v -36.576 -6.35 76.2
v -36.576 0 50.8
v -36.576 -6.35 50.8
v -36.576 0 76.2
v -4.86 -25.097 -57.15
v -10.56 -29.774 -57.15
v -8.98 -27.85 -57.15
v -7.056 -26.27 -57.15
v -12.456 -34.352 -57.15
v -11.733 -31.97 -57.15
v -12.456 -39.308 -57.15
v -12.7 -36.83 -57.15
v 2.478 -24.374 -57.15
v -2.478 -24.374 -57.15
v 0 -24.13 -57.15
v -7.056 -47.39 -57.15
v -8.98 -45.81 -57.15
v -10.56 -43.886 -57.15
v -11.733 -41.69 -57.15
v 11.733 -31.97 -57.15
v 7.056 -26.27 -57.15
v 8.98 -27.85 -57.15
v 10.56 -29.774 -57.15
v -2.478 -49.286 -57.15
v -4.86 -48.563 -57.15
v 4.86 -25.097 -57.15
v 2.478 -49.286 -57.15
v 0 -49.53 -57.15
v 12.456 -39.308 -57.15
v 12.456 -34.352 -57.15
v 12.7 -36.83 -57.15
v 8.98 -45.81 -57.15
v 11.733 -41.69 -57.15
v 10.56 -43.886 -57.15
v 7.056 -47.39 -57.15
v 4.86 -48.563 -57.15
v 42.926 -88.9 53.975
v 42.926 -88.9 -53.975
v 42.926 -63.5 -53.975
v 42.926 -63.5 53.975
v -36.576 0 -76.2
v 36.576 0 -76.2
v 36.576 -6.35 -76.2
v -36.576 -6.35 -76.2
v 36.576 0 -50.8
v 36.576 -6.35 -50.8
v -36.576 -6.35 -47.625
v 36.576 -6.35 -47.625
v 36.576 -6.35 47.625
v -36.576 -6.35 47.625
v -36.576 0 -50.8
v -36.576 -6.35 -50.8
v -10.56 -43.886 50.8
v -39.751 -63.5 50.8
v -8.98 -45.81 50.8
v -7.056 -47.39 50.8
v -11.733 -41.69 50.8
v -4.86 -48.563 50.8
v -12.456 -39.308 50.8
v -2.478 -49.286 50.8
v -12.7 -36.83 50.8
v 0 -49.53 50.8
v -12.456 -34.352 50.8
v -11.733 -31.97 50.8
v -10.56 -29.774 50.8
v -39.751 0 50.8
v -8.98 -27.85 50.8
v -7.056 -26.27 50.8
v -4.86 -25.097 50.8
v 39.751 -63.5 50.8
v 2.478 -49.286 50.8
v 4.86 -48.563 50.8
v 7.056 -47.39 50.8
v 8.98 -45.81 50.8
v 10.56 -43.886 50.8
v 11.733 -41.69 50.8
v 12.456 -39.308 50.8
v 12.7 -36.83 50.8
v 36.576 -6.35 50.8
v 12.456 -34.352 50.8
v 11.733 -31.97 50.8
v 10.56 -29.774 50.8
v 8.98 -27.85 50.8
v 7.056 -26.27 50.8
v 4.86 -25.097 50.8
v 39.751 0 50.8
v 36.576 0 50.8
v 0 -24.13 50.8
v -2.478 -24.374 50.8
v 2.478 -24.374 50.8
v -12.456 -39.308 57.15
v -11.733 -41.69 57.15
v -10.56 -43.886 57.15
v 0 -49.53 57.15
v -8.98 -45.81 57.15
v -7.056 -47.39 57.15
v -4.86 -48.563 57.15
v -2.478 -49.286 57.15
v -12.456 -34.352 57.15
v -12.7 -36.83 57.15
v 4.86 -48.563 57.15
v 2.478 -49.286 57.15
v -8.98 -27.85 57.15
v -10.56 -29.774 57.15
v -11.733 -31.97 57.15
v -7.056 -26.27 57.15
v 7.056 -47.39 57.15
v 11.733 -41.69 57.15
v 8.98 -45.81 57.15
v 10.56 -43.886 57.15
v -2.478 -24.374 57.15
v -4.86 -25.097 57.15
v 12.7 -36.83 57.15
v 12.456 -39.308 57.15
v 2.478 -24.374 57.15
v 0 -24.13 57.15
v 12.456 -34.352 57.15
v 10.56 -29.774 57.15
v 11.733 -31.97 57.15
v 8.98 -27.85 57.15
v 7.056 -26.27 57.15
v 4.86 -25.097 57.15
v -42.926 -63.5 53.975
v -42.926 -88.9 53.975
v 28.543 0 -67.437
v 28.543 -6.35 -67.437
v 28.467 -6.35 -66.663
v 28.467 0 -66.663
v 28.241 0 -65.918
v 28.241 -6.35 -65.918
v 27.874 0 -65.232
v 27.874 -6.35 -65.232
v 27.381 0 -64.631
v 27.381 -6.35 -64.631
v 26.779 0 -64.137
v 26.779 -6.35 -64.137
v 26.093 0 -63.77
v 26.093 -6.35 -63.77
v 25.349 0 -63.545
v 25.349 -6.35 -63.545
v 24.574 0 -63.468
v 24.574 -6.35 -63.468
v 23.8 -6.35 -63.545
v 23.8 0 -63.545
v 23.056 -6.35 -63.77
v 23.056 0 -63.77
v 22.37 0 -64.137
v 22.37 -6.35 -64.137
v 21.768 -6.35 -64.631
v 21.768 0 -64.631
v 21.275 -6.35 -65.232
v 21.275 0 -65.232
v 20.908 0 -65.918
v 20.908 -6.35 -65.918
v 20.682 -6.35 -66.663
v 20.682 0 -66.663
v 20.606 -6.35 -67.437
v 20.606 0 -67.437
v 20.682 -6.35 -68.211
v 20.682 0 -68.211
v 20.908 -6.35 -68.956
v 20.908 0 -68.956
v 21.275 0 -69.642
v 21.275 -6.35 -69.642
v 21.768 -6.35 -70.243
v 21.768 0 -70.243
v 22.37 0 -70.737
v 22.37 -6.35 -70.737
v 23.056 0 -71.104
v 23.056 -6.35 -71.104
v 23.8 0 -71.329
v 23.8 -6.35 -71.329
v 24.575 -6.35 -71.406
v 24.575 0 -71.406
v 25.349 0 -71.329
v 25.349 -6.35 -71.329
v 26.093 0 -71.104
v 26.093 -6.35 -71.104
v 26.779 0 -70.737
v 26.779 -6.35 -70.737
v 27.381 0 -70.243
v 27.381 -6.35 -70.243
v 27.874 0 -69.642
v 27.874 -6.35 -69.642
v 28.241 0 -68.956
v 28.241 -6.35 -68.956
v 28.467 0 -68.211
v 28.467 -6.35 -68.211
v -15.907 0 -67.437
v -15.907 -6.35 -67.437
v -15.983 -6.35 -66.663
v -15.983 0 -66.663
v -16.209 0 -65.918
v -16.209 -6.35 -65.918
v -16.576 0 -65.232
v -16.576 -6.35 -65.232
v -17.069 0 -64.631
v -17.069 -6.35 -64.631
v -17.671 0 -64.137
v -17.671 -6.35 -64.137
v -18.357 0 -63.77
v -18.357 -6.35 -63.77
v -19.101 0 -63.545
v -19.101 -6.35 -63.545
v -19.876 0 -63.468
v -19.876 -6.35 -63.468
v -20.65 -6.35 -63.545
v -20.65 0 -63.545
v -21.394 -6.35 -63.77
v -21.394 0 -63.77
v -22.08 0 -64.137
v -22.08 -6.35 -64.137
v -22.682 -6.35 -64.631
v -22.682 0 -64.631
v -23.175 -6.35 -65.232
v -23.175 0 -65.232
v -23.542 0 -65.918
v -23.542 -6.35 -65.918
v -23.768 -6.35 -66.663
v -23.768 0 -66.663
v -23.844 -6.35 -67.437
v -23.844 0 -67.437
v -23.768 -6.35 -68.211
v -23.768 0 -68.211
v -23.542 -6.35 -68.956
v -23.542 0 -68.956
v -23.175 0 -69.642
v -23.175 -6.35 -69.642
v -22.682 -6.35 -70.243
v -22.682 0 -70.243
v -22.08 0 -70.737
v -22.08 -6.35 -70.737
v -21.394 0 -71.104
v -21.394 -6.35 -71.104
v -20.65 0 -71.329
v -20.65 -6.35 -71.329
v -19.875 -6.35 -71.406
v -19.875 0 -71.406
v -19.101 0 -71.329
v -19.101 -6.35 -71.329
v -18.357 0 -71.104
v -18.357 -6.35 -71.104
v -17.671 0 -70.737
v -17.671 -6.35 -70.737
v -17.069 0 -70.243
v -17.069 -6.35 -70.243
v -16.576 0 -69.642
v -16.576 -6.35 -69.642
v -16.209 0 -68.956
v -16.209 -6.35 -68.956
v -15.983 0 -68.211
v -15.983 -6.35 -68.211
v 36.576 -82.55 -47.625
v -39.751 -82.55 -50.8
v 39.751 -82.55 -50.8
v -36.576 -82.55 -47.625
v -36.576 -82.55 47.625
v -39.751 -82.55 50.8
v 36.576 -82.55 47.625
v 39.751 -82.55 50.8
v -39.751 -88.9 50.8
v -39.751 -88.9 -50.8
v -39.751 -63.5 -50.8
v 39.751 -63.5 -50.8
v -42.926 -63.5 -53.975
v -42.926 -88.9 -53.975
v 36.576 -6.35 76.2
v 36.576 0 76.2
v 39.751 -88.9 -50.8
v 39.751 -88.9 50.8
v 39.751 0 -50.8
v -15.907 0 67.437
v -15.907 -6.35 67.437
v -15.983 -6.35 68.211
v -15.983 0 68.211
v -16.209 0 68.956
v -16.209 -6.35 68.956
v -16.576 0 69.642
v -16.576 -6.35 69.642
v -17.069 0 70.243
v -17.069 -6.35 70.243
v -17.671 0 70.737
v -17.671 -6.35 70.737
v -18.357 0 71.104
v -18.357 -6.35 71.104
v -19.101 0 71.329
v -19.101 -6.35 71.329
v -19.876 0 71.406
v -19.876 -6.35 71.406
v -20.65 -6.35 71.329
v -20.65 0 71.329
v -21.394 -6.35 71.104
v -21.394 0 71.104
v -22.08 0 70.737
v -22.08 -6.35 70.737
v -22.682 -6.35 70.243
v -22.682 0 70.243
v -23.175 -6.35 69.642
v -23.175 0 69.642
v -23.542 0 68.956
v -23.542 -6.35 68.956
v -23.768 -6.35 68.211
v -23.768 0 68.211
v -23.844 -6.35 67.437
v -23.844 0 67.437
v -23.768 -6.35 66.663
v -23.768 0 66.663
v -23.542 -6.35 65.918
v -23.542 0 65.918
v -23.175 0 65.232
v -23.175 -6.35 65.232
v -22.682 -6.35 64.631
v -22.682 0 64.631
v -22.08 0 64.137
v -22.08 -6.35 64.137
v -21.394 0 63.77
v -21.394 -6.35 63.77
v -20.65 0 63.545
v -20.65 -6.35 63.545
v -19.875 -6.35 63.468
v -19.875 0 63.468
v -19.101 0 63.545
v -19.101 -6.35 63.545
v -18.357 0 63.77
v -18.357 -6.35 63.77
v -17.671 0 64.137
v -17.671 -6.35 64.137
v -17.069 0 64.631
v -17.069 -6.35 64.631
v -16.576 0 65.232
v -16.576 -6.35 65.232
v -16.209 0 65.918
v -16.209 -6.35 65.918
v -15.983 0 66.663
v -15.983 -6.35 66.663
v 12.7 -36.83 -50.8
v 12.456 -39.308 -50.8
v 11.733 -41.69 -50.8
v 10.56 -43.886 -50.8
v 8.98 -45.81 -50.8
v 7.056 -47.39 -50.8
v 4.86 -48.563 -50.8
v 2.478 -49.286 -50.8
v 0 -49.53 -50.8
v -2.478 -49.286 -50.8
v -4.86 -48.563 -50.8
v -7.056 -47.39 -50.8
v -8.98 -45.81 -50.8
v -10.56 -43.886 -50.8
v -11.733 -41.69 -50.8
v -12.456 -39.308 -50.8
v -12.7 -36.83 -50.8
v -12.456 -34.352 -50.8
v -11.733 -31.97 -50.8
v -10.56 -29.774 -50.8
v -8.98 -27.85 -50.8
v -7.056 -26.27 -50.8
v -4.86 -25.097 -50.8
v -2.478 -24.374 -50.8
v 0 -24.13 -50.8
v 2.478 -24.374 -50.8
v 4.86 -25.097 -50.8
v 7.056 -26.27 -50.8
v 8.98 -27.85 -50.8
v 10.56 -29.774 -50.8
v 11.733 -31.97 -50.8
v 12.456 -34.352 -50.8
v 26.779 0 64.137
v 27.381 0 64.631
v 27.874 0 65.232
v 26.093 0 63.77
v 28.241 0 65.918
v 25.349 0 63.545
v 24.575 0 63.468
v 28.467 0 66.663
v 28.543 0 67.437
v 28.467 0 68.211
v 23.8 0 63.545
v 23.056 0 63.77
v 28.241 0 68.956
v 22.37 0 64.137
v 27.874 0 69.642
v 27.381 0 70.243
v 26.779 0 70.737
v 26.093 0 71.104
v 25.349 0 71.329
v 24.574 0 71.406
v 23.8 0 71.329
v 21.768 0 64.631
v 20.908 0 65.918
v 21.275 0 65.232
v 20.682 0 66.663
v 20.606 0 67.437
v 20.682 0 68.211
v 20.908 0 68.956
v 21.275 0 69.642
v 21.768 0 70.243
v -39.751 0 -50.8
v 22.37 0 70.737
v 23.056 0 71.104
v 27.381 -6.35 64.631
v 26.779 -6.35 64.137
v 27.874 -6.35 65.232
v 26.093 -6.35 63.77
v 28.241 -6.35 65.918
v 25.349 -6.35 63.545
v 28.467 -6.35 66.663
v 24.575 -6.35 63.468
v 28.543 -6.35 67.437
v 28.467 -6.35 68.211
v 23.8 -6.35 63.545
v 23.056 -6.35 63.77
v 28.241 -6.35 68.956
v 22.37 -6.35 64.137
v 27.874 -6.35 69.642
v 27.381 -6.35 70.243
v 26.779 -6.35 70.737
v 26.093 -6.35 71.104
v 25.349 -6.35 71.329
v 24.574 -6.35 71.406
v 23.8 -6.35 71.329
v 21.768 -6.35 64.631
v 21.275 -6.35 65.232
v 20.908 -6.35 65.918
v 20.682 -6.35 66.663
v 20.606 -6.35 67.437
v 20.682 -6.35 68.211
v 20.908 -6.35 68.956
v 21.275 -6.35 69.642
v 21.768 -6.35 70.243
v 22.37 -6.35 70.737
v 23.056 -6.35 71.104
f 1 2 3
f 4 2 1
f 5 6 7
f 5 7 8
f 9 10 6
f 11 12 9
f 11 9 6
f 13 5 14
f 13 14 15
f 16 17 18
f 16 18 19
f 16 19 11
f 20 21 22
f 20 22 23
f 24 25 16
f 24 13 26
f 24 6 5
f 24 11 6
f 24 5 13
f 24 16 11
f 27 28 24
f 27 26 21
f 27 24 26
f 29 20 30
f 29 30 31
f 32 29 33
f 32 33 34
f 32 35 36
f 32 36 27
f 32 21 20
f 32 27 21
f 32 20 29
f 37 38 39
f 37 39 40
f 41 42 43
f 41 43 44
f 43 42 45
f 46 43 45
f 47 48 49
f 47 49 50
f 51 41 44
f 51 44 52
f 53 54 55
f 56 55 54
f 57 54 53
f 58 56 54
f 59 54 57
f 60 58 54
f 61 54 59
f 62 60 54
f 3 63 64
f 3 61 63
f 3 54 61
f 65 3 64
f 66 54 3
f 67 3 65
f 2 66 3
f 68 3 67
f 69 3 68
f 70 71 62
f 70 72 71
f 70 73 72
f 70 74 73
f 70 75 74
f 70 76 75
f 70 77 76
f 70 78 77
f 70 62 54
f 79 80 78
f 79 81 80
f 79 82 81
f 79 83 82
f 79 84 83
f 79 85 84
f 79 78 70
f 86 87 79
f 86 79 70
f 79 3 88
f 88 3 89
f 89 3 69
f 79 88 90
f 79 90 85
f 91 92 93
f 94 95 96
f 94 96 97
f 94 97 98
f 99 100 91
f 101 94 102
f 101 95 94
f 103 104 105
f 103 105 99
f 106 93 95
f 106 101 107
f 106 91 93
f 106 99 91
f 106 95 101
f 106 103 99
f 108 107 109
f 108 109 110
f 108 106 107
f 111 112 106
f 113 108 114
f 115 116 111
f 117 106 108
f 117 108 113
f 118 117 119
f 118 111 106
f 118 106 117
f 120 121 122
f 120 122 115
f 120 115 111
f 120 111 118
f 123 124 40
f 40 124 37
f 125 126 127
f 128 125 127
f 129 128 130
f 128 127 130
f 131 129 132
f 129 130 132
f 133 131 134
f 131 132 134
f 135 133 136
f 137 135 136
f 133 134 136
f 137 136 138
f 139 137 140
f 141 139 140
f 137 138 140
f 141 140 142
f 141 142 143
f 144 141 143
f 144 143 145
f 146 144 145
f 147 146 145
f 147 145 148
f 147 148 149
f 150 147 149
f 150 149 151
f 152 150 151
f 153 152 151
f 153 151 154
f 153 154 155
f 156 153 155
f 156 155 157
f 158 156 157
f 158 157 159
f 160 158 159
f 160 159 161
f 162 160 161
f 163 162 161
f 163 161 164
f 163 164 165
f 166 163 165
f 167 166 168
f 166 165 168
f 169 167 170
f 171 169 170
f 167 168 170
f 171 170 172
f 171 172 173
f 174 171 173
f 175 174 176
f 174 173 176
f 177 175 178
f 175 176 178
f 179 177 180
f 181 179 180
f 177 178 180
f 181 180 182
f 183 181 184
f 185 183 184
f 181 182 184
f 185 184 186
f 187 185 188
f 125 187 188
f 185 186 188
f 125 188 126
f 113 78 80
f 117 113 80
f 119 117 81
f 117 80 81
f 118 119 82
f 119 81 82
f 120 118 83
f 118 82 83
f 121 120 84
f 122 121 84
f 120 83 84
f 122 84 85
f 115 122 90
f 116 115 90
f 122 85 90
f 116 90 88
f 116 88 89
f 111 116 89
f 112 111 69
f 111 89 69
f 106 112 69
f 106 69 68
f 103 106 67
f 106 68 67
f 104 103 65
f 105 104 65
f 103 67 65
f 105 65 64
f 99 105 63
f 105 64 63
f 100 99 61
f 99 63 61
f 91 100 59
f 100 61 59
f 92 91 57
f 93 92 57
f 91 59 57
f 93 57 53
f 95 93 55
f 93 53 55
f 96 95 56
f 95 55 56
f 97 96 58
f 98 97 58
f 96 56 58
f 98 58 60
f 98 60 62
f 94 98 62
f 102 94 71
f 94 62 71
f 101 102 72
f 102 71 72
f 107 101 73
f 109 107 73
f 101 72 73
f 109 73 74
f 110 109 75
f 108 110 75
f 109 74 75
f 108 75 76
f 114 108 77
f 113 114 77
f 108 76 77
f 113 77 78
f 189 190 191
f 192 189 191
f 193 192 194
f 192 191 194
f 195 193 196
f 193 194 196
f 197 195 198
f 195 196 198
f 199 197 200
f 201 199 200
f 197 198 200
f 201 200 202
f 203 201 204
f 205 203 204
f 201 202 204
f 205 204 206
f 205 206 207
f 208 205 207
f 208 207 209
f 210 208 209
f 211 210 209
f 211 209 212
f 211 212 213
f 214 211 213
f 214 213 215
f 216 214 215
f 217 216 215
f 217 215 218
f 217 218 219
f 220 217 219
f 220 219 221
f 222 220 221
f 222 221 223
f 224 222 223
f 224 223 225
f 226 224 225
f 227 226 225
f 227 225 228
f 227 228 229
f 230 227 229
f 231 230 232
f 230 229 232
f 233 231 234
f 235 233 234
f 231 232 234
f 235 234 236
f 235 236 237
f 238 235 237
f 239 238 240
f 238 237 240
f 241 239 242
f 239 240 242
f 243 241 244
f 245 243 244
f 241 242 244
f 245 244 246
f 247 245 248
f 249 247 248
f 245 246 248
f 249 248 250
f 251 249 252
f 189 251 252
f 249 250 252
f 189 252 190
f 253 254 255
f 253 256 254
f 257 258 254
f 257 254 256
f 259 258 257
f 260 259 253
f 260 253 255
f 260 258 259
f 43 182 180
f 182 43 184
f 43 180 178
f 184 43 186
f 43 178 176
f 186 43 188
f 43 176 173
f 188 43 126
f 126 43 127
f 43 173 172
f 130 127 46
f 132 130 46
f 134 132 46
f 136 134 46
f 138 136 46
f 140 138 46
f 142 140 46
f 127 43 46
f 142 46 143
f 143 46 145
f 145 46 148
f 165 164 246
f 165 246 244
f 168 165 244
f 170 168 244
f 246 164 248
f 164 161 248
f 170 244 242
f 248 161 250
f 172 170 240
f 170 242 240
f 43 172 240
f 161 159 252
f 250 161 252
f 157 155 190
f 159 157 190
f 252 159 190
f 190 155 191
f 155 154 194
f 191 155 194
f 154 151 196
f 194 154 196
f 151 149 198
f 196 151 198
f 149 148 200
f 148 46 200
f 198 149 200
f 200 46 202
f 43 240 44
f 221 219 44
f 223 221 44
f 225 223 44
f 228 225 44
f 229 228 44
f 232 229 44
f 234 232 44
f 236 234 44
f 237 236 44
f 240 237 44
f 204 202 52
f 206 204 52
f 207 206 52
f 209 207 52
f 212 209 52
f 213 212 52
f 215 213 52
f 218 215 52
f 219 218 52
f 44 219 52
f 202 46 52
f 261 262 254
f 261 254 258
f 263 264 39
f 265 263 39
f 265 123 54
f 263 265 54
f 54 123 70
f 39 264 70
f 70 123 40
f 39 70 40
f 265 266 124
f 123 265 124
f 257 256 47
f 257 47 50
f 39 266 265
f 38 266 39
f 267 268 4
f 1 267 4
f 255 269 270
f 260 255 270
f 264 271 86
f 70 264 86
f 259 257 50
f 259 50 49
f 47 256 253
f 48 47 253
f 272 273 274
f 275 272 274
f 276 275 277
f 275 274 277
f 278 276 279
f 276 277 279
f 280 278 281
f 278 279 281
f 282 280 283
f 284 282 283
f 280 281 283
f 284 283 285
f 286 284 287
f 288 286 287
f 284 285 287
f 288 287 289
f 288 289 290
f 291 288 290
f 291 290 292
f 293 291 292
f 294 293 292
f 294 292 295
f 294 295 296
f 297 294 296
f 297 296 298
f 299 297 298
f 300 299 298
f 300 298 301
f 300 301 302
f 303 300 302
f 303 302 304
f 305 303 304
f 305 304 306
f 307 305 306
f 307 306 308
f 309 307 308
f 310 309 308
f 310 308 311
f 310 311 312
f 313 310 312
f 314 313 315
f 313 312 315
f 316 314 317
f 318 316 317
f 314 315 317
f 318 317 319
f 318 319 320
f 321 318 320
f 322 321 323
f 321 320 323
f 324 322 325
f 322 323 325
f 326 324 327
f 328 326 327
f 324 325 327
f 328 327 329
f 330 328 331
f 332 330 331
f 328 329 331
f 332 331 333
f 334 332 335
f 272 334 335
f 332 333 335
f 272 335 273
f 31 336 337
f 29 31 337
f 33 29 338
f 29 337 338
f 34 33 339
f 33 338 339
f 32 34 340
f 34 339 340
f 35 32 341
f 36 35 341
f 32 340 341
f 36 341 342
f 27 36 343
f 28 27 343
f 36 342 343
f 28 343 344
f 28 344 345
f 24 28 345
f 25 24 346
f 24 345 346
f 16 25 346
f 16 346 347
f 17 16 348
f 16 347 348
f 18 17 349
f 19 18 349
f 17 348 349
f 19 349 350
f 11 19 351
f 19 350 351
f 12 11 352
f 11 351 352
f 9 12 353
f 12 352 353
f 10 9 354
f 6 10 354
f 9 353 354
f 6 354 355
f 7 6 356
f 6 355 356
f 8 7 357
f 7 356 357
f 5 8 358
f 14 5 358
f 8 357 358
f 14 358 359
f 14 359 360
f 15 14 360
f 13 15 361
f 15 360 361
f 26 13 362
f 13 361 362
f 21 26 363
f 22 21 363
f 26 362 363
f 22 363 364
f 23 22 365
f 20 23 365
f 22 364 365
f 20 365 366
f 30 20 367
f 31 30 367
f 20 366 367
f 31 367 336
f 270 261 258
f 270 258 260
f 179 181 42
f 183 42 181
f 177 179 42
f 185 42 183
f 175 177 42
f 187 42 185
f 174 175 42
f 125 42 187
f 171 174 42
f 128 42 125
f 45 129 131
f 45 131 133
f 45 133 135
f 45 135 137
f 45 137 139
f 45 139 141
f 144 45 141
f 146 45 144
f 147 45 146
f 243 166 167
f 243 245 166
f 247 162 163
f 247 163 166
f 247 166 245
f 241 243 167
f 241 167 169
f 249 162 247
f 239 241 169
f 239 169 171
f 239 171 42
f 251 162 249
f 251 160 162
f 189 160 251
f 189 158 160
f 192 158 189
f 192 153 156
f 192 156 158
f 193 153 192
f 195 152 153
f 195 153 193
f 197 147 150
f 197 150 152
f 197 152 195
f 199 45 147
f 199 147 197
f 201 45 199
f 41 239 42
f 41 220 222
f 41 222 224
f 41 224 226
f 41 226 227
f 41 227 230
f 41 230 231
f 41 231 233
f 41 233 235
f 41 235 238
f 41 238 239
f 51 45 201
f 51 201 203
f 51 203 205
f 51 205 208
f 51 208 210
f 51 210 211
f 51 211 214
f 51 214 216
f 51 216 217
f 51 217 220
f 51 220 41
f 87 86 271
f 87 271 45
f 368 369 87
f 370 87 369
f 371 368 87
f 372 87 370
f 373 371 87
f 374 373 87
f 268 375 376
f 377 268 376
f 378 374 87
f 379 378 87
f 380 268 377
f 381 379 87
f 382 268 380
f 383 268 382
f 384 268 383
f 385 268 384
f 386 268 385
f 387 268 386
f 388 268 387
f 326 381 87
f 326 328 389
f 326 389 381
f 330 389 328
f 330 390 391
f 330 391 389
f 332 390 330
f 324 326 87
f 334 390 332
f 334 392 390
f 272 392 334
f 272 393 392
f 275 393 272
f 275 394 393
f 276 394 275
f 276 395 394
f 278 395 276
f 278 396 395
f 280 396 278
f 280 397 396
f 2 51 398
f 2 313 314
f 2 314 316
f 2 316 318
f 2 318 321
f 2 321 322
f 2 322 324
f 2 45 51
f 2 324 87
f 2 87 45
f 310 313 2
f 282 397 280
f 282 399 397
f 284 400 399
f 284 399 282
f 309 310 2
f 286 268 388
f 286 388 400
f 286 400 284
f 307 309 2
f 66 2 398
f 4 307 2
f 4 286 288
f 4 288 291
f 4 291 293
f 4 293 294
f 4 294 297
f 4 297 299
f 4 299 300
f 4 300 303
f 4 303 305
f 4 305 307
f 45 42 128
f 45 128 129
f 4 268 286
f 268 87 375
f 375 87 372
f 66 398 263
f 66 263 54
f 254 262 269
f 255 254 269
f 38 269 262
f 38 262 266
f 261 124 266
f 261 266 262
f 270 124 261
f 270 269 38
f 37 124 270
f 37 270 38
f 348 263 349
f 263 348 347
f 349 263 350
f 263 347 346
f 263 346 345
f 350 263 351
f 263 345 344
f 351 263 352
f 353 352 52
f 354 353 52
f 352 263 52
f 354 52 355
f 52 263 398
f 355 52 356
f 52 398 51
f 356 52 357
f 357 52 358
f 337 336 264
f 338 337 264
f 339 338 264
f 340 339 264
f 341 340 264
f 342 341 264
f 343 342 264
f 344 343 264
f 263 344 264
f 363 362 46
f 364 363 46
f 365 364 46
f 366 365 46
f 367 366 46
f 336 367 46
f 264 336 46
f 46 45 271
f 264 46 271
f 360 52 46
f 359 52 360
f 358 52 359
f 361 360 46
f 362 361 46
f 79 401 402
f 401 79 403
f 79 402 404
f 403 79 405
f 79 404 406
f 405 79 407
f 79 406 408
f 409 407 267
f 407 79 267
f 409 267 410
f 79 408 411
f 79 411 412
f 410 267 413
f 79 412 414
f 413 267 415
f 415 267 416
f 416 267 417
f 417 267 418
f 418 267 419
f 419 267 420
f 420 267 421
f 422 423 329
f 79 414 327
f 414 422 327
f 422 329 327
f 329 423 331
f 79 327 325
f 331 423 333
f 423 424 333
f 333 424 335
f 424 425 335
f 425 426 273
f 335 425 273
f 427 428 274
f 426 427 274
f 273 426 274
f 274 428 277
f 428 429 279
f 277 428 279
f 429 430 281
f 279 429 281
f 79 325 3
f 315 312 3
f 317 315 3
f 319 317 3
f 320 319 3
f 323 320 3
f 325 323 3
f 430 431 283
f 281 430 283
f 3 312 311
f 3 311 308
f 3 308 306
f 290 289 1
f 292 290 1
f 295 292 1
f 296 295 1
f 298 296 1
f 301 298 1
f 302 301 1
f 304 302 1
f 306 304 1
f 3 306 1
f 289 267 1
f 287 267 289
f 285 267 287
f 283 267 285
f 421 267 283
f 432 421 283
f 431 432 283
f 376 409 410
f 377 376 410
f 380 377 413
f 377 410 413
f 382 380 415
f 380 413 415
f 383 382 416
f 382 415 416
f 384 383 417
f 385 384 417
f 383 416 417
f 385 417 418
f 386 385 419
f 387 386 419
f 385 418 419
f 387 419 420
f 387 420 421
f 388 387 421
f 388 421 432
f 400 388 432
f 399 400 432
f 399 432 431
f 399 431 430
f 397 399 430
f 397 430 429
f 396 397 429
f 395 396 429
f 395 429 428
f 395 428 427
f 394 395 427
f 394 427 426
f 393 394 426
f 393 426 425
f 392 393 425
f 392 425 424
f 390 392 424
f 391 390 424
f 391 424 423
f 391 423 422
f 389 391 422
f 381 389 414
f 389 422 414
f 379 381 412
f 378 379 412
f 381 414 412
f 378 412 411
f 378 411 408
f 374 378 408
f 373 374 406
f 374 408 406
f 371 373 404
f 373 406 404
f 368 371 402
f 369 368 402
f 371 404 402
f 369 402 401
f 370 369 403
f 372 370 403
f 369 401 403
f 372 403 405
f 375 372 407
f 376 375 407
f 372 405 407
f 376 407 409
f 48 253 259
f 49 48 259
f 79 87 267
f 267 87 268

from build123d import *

# Parameters (mm, degrees)
F0_W      = 79.502
F0_H      = 101.6
F1_DEPTH  = 88.9
F2_W      = 85.852
F2_H      = 107.95
F3_DEPTH  = 25.4
F4_W      = 73.152
F4_H      = 95.25
F5_DEPTH  = 85.725
F6_W      = 73.152
F6_H      = 152.4
F7_DEPTH  = 6.35
F8_R      = 3.96875
F9_DEPTH  = 6.351
F10_W     = 79.502
F10_H     = 101.6
F10_W_2   = 73.152
F10_H_2   = 95.25
F11_DEPTH = 6.35
F12_R     = 12.7
F13_DEPTH = 6.35
F14_R     = 12.7
F15_DEPTH = 6.35


with BuildPart() as f1:
    # F0 (on Front) → F1 (new body)
    with BuildSketch(Plane.XZ):
        Rectangle(F0_W, F0_H)
    extrude(amount=F1_DEPTH)

    # F2 (on face) → F3 (join)
    with BuildSketch(Plane.XZ.offset(88.9)):
        Rectangle(F2_W, F2_H)
    extrude(amount=-F3_DEPTH)

    # F4 (on face) → F5 (cut)
    with BuildSketch(Plane.XZ.offset(88.9)):
        Rectangle(F4_W, F4_H)
    extrude(amount=-F5_DEPTH, mode=Mode.SUBTRACT)

    # F6 (on face) → F7 (join)
    with BuildSketch(Plane(origin=(0, 0, 0), x_dir=(-1, 0, 0), z_dir=(0, 1, 0))):
        Rectangle(F6_W, F6_H)
    extrude(amount=-F7_DEPTH)

    # F8 (on face) → F9 (cut, through all)
    with BuildSketch(Plane.XZ.offset(6.35)):
        with Locations((-19.8755, 67.437)):
            Circle(F8_R)
        with Locations((24.5745, 67.437)):
            Circle(F8_R)
        with Locations((-19.8755, -67.437)):
            Circle(F8_R)
        with Locations((24.5745, -67.437)):
            Circle(F8_R)
    extrude(amount=-F9_DEPTH, mode=Mode.SUBTRACT)

    # F10 (on face) → F11 (cut)
    with BuildSketch(Plane.XZ.offset(88.9)):
        Rectangle(F10_W, F10_H)
        Rectangle(F10_W_2, F10_H_2, mode=Mode.SUBTRACT)
    extrude(amount=-F11_DEPTH, mode=Mode.SUBTRACT)

    # F12 (on face) → F13 (join)
    with BuildSketch(Plane.XY.offset(50.8)):
        with Locations((0, -36.83)):
            Circle(F12_R)
    extrude(amount=F13_DEPTH)

    # F14 (on face) → F15 (join)
    with BuildSketch(Plane(origin=(0, 0, -50.8), x_dir=(1, 0, 0), z_dir=(0, 0, -1))):
        with Locations((0, 36.83)):
            Circle(F14_R)
    extrude(amount=F15_DEPTH)


solid = f1.part
